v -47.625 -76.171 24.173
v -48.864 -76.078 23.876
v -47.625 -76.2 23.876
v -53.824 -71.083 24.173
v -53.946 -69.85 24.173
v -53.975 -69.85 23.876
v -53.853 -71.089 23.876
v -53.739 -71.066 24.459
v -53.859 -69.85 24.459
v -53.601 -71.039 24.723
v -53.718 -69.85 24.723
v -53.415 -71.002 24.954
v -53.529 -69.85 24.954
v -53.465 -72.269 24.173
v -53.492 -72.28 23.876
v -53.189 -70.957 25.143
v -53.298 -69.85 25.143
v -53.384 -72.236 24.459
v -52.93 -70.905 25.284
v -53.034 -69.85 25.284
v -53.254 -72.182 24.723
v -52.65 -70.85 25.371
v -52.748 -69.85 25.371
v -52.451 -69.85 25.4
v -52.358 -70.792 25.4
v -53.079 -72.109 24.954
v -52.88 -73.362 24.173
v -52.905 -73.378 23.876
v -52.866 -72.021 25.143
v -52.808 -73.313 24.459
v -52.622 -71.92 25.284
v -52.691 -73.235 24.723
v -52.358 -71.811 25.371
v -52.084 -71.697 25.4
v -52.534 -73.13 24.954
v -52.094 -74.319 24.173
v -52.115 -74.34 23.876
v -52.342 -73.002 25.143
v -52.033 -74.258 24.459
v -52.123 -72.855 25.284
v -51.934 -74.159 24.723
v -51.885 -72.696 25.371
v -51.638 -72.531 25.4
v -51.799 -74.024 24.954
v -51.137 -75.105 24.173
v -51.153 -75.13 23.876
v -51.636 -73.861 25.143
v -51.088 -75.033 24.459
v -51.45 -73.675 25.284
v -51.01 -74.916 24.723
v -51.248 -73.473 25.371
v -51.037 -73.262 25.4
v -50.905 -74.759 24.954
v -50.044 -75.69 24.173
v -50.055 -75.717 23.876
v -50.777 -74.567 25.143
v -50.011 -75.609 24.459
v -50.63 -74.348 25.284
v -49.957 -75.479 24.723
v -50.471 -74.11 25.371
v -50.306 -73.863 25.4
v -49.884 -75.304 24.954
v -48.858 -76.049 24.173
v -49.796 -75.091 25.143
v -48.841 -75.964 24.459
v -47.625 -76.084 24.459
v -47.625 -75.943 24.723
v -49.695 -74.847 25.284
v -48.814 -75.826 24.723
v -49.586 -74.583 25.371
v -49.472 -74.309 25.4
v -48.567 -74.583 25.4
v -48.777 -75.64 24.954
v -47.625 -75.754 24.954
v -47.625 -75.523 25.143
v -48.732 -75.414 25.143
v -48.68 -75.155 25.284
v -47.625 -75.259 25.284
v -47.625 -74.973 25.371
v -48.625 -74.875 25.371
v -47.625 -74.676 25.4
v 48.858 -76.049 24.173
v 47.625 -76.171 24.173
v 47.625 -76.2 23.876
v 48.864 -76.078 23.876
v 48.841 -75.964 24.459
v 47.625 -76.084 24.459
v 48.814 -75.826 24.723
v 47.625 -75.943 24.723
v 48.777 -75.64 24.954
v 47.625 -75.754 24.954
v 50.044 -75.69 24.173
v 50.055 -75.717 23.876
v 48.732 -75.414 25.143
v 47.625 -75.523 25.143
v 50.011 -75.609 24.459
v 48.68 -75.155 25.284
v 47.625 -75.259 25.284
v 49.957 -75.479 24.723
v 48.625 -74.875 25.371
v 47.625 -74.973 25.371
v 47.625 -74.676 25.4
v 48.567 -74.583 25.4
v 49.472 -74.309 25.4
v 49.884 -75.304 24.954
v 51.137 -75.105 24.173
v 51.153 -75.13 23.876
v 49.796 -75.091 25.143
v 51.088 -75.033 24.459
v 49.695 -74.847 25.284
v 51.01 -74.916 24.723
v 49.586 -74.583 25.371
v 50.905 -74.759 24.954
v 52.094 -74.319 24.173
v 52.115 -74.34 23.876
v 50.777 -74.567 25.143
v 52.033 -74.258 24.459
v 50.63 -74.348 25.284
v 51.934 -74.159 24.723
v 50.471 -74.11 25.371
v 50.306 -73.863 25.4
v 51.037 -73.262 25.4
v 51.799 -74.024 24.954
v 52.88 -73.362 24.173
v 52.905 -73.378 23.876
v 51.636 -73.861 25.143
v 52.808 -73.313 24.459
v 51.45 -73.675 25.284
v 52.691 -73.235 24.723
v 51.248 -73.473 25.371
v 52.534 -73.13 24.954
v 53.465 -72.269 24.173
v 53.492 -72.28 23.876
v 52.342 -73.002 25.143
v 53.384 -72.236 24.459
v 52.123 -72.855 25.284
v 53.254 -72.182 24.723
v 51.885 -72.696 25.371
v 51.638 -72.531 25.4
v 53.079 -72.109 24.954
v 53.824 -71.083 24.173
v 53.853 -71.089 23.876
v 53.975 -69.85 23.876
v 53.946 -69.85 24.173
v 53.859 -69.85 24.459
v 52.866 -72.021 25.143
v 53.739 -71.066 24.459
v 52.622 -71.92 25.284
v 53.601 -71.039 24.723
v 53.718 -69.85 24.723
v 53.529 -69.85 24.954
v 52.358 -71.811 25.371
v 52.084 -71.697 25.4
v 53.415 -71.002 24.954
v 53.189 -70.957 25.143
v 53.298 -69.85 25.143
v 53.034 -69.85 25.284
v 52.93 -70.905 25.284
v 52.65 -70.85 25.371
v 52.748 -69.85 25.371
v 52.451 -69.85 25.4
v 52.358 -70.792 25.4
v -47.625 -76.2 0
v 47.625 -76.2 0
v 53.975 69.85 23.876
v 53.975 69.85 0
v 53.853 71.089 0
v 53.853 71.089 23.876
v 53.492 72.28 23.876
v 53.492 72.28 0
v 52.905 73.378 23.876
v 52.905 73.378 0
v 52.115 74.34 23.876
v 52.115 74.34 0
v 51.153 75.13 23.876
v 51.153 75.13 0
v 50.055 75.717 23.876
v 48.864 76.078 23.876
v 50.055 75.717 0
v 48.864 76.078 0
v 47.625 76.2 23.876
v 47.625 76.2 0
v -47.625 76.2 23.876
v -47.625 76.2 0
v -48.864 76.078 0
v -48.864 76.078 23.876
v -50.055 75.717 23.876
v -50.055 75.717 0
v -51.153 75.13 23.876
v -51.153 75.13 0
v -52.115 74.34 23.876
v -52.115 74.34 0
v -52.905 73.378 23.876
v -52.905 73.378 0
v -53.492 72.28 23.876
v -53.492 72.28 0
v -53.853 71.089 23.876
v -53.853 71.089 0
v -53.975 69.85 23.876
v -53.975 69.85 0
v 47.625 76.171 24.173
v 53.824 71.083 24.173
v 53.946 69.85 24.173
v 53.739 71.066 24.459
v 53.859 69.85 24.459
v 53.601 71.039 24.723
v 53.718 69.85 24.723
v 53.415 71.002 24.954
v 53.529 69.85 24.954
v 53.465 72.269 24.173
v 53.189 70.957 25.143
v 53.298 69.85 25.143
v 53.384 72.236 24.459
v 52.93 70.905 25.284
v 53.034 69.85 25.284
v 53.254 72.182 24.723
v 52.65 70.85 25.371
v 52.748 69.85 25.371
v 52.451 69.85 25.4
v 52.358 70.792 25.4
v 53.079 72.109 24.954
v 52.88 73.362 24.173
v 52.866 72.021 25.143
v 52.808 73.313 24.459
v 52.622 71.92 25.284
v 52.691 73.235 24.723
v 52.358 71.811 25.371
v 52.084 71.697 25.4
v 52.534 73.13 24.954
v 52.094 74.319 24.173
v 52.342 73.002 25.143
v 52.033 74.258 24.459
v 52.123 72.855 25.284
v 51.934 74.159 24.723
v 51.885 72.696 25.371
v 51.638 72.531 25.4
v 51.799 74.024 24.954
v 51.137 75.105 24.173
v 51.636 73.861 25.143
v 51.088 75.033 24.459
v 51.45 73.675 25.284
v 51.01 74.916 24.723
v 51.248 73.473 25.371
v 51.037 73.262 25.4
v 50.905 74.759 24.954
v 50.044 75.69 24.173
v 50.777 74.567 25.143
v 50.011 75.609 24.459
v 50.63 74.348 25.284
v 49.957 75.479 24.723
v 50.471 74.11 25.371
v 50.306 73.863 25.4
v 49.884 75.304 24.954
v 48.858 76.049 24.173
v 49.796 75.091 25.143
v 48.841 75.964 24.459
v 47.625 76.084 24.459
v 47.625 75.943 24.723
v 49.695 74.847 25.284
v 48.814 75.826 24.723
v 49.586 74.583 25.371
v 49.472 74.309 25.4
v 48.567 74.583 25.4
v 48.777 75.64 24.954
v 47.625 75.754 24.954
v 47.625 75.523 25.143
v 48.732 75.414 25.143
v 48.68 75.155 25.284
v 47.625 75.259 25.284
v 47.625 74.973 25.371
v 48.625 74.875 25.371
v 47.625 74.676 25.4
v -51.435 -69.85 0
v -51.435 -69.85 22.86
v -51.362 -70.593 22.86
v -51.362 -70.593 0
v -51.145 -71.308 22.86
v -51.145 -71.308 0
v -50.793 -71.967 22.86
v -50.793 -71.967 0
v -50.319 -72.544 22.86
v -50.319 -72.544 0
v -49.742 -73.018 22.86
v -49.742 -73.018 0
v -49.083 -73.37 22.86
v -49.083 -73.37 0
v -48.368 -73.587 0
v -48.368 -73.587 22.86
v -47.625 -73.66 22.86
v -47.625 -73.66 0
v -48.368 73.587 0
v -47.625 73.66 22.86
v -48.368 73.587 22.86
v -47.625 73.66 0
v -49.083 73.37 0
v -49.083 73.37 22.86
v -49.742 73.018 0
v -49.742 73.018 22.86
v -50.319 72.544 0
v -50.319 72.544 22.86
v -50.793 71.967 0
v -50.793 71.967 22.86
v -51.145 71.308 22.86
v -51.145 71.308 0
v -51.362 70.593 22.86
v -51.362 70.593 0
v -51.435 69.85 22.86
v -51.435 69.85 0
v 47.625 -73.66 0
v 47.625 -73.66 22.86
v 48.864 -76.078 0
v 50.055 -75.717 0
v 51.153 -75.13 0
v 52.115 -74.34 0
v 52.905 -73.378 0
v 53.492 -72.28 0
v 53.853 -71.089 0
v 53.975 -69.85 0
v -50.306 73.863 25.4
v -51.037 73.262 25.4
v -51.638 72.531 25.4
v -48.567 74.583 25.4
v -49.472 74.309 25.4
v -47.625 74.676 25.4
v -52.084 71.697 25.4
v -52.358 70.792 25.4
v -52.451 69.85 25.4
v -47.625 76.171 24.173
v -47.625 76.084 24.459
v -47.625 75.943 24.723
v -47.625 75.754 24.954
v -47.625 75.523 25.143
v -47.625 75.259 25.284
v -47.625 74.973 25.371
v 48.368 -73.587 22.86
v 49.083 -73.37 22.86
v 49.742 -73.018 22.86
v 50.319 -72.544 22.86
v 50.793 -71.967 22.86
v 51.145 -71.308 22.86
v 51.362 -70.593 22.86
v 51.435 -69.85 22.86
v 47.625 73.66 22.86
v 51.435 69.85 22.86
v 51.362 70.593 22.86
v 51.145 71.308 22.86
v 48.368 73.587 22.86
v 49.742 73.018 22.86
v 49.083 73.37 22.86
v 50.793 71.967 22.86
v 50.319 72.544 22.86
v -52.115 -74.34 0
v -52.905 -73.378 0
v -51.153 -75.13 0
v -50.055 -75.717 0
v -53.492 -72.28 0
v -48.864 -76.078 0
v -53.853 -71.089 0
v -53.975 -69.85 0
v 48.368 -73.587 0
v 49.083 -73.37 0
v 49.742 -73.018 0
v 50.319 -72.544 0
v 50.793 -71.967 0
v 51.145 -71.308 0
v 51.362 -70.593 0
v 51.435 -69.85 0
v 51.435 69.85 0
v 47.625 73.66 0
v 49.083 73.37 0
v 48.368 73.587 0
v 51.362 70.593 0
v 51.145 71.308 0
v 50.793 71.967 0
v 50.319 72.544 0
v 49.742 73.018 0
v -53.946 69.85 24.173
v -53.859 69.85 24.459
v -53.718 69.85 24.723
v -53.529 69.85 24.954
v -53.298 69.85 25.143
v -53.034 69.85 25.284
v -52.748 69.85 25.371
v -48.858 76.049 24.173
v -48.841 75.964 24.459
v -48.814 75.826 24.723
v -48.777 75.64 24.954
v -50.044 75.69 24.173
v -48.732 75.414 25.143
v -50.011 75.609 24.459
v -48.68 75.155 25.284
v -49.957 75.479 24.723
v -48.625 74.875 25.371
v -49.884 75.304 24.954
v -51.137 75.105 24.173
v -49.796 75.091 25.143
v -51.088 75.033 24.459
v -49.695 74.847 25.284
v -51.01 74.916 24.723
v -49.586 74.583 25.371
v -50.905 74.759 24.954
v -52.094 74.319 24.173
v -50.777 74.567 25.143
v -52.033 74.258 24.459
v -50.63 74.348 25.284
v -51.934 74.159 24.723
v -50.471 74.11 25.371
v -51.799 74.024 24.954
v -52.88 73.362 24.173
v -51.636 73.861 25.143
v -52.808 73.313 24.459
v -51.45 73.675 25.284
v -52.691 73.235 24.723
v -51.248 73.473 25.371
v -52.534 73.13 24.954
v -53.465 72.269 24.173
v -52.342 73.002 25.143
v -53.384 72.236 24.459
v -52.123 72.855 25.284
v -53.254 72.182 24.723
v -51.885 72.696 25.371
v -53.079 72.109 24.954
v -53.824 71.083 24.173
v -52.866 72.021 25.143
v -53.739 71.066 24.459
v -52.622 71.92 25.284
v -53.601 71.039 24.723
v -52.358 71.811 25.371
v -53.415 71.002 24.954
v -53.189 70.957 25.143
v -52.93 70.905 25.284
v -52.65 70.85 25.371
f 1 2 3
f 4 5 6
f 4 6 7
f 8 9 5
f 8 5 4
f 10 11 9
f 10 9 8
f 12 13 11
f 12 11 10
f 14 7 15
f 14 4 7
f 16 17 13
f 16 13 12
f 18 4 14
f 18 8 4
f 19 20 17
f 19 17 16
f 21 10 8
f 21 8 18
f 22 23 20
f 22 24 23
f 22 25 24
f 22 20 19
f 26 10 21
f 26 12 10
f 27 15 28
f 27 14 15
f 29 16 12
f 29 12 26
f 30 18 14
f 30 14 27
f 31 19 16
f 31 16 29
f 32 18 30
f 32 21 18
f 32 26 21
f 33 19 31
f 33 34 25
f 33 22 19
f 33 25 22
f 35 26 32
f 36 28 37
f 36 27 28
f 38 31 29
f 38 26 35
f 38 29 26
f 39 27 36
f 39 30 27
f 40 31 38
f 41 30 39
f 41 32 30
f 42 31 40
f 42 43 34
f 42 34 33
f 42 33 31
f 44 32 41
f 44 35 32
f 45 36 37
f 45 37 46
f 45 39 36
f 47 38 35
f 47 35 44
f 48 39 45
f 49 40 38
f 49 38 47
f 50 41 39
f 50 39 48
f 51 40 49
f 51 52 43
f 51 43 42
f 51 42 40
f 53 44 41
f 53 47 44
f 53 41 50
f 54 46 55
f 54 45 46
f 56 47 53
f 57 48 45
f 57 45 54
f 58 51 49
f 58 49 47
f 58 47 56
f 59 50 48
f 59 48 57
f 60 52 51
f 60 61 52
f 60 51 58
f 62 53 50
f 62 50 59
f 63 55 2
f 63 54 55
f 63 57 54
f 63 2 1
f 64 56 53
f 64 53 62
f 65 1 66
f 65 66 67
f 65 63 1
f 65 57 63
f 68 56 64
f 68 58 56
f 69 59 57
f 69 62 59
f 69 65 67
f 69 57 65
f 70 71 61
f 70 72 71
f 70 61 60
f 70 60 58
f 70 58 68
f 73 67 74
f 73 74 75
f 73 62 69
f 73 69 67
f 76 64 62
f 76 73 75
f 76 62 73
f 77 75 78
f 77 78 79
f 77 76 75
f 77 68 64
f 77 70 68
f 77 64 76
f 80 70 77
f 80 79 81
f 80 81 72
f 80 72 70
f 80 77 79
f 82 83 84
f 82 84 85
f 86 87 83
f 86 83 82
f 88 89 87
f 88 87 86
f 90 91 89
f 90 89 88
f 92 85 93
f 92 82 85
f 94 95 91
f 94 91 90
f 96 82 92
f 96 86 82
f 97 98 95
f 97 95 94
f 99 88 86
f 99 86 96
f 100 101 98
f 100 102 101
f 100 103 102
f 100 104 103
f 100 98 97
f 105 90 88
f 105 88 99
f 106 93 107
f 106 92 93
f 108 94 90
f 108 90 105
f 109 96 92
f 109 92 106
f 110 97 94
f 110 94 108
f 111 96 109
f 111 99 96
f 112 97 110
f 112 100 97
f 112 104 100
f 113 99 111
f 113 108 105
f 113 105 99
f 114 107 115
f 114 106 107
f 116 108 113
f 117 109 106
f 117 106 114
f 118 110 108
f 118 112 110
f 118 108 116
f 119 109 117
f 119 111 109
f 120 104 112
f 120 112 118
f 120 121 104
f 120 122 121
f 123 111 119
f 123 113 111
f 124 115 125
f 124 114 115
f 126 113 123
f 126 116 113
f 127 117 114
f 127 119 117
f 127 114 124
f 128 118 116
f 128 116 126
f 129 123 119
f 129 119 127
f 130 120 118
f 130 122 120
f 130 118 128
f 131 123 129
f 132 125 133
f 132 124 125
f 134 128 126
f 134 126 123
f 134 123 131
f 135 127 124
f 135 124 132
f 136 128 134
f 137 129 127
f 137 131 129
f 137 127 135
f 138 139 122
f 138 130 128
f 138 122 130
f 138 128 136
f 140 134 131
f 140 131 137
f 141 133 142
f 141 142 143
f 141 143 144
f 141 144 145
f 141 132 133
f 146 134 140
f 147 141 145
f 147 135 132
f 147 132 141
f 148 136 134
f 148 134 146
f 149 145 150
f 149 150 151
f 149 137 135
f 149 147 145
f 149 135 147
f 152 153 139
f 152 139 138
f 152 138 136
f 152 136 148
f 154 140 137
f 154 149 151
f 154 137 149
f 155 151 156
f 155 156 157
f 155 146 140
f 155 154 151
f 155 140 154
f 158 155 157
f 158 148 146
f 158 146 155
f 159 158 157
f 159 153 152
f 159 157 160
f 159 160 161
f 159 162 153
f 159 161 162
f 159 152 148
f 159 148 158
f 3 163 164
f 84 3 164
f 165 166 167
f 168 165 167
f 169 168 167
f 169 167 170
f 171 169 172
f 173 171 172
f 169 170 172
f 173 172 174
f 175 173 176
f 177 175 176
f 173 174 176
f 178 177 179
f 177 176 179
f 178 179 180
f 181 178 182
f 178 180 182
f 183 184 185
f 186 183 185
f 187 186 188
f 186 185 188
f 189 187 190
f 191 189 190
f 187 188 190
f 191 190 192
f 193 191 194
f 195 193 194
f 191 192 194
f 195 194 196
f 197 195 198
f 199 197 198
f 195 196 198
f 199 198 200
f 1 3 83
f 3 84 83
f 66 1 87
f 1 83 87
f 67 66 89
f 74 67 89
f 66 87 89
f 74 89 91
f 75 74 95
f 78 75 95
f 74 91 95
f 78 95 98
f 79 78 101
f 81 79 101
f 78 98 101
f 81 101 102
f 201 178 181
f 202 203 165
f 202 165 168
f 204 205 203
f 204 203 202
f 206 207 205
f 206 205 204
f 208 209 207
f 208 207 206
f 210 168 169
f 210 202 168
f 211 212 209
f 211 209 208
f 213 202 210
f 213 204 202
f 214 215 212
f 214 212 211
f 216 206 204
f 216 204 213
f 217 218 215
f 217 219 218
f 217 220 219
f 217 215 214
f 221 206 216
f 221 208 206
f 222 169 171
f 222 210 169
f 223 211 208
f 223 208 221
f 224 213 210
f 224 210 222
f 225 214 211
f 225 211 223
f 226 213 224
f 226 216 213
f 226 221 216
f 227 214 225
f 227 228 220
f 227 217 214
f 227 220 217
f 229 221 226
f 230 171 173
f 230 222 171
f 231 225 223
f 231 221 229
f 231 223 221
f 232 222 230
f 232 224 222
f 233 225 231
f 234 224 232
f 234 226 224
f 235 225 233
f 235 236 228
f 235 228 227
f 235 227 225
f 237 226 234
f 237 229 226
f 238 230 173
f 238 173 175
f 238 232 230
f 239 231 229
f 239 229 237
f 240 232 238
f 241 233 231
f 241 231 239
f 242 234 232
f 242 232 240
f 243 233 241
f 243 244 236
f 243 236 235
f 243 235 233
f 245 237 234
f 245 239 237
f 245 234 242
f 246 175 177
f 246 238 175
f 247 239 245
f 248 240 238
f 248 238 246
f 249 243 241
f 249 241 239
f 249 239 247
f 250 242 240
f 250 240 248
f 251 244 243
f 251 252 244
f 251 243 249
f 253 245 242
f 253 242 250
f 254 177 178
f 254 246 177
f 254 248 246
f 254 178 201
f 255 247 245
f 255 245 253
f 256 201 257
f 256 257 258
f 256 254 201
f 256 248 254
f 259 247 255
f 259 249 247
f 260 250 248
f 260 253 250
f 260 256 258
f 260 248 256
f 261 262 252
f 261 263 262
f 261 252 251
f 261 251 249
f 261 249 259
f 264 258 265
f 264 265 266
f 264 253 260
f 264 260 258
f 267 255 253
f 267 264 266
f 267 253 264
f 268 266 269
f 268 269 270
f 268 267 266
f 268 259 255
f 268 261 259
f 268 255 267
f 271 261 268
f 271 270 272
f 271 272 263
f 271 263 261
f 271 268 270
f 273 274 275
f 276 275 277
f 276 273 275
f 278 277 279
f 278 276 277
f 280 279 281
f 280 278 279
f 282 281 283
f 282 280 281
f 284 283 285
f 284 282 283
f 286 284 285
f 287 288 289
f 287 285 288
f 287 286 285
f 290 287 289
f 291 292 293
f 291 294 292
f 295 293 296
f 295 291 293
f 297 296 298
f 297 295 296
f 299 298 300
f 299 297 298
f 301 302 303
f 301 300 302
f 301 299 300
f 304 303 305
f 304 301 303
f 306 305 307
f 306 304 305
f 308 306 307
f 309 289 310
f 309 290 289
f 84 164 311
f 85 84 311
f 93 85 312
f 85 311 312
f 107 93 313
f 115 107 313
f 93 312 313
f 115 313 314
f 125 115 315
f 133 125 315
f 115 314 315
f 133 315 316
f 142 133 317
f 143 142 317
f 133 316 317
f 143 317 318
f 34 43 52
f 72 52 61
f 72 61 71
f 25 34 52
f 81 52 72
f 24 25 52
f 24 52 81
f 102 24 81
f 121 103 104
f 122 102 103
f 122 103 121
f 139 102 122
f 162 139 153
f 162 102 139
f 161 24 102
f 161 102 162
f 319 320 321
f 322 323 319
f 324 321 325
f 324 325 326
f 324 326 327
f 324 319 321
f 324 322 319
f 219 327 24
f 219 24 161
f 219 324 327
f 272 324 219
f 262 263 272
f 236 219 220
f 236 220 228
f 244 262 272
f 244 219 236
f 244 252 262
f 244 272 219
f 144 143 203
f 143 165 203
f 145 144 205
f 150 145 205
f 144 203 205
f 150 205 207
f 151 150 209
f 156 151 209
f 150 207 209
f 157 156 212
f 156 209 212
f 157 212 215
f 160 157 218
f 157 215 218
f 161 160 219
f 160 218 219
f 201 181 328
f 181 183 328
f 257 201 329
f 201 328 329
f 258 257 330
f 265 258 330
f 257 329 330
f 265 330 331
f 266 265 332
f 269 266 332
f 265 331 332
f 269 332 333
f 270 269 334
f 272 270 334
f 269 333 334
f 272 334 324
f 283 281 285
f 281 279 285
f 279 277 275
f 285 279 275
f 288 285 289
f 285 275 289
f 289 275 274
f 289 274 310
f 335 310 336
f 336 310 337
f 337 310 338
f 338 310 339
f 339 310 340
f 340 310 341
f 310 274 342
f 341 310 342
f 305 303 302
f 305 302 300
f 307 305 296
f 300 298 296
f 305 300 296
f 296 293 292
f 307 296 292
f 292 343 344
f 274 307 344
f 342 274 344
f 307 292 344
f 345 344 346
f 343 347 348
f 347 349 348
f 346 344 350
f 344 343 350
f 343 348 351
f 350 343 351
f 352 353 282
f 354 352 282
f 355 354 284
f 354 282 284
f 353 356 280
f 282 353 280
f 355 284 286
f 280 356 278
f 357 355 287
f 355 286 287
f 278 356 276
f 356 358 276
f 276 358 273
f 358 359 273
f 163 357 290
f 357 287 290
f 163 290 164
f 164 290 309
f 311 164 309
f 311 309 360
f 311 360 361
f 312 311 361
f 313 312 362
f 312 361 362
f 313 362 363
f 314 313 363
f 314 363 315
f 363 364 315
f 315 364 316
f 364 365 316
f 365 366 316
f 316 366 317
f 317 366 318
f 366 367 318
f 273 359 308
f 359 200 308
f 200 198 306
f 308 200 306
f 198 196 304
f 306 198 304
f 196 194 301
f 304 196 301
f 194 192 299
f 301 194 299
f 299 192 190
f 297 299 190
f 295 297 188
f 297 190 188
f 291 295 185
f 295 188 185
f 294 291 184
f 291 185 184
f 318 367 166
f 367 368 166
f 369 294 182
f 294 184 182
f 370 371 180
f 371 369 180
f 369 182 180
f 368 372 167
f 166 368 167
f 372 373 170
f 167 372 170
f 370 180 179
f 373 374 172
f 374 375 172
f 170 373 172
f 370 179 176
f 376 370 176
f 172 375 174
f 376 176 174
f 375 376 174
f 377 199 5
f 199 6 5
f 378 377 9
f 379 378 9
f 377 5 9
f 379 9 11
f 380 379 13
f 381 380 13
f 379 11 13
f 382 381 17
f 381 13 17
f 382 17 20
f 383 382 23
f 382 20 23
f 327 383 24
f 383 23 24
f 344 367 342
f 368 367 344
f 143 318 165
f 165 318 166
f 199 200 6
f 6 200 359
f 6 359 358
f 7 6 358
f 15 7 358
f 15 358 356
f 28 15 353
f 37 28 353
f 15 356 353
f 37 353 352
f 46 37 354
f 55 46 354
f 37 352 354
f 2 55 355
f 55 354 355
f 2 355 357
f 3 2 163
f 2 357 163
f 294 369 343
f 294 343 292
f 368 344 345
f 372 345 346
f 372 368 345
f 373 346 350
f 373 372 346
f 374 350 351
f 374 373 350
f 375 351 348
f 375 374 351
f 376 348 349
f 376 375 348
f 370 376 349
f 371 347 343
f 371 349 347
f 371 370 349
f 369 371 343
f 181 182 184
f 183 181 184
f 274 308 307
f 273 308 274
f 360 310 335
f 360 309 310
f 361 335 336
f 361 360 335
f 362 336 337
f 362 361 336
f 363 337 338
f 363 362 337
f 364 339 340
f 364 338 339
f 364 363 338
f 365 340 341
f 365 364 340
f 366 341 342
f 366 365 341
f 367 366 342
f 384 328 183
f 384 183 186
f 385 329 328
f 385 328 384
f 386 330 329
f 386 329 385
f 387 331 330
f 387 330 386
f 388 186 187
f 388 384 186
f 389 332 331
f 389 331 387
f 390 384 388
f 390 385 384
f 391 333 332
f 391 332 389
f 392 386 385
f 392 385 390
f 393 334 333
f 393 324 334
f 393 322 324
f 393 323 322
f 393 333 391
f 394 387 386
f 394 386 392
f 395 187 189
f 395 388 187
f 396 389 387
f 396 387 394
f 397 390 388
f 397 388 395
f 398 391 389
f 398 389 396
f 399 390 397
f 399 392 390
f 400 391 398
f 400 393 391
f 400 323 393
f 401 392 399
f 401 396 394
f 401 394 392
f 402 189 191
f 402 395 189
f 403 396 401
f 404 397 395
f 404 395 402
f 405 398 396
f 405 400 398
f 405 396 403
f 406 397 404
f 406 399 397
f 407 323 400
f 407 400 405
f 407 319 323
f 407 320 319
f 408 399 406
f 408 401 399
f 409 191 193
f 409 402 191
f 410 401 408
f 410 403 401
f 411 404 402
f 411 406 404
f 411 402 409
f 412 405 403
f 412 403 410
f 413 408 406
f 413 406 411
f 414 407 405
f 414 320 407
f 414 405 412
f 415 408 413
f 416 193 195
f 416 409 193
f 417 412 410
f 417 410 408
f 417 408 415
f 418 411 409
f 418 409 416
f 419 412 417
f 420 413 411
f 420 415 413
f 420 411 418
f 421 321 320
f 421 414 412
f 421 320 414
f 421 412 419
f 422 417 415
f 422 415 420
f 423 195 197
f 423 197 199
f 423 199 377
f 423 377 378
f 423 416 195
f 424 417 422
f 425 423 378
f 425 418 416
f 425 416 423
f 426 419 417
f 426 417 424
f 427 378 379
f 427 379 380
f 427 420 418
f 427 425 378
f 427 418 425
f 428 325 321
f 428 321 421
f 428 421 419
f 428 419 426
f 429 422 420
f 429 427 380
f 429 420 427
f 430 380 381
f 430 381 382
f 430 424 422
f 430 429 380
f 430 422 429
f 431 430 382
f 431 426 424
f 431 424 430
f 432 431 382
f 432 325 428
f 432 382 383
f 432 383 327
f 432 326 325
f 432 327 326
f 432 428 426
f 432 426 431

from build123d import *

# Parameters (mm, degrees)
F1_DEPTH = 25.4
F2_R     = 1.524
F3_T     = -2.54


with BuildPart() as f1:
    # F0 (on Top) → F1 (new body)
    with BuildSketch(Plane.XY):
        with BuildLine():
            Line((47.625, 76.2), (-47.625, 76.2))
            ThreePointArc((-47.625, 76.2), (-52.115128, 74.340128), (-53.975, 69.85))
            Line((-53.975, 69.85), (-53.975, -69.85))
            ThreePointArc((-53.975, -69.85), (-52.115128, -74.340128), (-47.625, -76.2))
            Line((-47.625, -76.2), (47.625, -76.2))
            ThreePointArc((47.625, -76.2), (52.115128, -74.340128), (53.975, -69.85))
            Line((53.975, -69.85), (53.975, 69.85))
            ThreePointArc((53.975, 69.85), (52.115128, 74.340128), (47.625, 76.2))
        make_face()
    extrude(amount=F1_DEPTH)

    # F2
    f2_edges = [f1.edges().sort_by_distance(p)[0] for p in [
        (0, 76.2, 25.4),
    ]]
    fillet(f2_edges, radius=F2_R)

    # F3
    f3_openings = [f1.faces().sort_by_distance(p)[0] for p in [
        (0, 0, 0),
    ]]
    offset(amount=F3_T, openings=f3_openings)


solid = f1.part
